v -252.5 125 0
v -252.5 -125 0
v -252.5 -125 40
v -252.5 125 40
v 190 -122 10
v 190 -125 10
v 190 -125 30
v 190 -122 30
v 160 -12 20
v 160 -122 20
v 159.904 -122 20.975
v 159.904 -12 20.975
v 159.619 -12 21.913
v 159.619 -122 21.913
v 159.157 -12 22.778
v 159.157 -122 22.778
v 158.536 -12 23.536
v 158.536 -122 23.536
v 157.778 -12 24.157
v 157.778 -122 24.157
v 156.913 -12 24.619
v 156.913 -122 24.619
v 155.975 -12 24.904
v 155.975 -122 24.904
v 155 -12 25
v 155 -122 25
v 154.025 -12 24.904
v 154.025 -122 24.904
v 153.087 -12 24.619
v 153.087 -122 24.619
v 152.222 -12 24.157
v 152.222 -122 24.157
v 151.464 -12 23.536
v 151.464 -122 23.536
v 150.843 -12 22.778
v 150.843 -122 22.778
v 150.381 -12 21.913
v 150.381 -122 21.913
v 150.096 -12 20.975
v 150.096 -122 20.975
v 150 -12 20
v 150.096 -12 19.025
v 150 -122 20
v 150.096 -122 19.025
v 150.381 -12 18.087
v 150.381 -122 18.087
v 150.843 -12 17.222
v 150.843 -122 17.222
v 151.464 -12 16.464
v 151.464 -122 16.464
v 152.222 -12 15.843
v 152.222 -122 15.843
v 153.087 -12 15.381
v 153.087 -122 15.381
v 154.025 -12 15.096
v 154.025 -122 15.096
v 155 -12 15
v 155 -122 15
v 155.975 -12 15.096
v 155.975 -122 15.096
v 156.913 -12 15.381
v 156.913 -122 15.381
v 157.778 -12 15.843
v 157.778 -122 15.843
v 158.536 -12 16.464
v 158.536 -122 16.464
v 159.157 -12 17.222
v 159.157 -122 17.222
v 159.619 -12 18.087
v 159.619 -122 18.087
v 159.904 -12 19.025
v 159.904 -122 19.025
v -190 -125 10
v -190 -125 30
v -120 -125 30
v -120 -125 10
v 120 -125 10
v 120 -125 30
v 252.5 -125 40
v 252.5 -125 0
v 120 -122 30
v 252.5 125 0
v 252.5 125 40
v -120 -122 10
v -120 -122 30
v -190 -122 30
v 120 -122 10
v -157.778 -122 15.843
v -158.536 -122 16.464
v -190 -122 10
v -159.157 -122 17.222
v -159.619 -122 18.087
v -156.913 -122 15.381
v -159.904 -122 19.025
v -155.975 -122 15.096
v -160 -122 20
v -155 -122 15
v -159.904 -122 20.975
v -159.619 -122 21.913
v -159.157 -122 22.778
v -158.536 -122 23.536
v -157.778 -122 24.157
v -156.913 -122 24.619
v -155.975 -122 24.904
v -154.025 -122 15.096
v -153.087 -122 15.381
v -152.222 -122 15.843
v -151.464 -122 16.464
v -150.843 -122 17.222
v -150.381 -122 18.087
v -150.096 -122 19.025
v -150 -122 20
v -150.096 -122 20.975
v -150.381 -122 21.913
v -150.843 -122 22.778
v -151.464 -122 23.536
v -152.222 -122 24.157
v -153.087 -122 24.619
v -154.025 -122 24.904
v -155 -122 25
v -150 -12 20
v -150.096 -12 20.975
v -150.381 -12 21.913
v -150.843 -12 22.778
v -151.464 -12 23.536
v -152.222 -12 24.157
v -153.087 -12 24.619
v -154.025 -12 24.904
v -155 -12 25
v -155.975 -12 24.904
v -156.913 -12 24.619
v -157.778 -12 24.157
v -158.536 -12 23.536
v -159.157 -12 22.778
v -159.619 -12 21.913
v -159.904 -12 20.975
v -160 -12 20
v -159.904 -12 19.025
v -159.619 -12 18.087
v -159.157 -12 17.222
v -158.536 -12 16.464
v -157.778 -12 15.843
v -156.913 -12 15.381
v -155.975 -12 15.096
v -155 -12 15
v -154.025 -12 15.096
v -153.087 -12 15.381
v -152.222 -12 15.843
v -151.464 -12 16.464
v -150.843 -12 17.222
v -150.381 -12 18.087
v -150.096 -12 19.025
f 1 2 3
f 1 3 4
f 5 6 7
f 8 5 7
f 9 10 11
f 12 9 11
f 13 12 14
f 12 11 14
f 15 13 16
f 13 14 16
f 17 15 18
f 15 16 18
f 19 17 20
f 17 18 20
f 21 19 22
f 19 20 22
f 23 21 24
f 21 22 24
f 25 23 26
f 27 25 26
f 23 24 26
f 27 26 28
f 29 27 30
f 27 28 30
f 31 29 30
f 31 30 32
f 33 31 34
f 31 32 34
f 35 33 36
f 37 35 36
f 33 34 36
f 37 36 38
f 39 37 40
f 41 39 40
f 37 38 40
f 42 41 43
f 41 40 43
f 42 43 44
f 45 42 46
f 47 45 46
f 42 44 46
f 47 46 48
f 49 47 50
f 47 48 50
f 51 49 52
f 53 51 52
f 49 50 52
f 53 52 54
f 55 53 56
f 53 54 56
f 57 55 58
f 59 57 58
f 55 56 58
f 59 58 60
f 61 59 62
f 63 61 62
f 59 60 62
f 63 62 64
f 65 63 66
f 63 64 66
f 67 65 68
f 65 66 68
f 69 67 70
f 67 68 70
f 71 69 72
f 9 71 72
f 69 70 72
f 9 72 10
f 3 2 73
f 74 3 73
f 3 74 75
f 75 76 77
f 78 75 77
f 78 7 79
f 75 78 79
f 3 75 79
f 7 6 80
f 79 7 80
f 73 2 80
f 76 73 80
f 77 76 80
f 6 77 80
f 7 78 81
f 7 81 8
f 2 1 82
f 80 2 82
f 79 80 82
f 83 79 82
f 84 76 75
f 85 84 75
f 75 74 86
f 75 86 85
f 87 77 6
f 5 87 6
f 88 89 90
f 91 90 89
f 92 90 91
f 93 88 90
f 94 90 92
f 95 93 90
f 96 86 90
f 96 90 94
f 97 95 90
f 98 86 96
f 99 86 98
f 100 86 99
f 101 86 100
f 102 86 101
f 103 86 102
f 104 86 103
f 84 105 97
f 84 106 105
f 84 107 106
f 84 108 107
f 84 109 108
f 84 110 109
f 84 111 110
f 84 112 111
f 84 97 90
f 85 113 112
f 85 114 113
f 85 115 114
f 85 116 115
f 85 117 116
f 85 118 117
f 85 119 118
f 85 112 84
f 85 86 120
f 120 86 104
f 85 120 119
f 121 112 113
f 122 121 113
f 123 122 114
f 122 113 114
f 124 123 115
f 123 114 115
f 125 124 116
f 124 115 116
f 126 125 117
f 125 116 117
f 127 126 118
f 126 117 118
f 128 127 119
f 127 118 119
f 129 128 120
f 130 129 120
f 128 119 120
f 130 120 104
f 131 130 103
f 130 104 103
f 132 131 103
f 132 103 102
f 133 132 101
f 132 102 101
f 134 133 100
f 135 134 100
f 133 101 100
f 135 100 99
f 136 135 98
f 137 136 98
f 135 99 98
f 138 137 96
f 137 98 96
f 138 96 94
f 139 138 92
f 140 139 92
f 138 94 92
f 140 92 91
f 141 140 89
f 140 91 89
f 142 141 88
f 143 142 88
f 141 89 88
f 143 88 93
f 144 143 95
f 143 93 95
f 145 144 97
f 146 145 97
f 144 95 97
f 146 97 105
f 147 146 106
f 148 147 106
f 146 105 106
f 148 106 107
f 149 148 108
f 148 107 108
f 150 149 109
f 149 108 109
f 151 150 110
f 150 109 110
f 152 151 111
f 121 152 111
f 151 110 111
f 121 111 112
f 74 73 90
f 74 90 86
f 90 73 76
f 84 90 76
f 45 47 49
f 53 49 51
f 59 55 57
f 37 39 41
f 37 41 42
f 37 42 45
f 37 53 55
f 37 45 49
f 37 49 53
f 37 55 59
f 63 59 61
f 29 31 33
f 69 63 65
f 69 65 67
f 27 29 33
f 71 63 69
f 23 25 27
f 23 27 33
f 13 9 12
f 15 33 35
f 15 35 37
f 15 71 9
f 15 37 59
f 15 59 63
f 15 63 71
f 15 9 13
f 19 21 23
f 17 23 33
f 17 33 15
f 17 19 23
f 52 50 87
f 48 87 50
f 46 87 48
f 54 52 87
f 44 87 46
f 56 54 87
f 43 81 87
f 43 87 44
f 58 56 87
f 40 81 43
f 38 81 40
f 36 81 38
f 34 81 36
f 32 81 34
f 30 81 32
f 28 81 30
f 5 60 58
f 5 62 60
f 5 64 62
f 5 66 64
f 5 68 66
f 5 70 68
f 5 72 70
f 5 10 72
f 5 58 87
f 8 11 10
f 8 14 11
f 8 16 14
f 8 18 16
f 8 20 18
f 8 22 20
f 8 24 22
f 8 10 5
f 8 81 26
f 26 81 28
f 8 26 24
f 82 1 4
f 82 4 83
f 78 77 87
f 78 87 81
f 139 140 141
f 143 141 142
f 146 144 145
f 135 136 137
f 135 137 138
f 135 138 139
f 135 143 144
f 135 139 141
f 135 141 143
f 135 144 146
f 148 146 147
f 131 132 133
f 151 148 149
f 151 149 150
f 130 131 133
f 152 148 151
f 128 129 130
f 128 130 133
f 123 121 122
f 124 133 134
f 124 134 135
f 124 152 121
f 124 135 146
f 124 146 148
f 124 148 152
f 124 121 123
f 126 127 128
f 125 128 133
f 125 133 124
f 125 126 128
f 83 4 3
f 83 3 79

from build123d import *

# Parameters (mm, degrees)
F0_W     = 505
F0_H     = 250
F1_DEPTH = 40
F2_W     = 70
F2_H     = 20
F3_DEPTH = 3
F4_R     = 5
F5_DEPTH = 110


with BuildPart() as f1:
    # F0 (on Top) → F1 (new body)
    with BuildSketch(Plane.XY):
        Rectangle(F0_W, F0_H)
    extrude(amount=F1_DEPTH)

    # F2 (on face) → F3 (cut)
    with BuildSketch(Plane.XZ.offset(125)):
        with Locations((155, 20)):
            Rectangle(F2_W, F2_H)
        with Locations((-155, 20)):
            Rectangle(F2_W, F2_H)
    extrude(amount=-F3_DEPTH, mode=Mode.SUBTRACT)

    # F4 (on face) → F5 (cut)
    with BuildSketch(Plane.XZ.offset(122)):
        with Locations((-155, 20)):
            Circle(F4_R)
        with Locations((155, 20)):
            Circle(F4_R)
    extrude(amount=-F5_DEPTH, mode=Mode.SUBTRACT)


solid = f1.part
